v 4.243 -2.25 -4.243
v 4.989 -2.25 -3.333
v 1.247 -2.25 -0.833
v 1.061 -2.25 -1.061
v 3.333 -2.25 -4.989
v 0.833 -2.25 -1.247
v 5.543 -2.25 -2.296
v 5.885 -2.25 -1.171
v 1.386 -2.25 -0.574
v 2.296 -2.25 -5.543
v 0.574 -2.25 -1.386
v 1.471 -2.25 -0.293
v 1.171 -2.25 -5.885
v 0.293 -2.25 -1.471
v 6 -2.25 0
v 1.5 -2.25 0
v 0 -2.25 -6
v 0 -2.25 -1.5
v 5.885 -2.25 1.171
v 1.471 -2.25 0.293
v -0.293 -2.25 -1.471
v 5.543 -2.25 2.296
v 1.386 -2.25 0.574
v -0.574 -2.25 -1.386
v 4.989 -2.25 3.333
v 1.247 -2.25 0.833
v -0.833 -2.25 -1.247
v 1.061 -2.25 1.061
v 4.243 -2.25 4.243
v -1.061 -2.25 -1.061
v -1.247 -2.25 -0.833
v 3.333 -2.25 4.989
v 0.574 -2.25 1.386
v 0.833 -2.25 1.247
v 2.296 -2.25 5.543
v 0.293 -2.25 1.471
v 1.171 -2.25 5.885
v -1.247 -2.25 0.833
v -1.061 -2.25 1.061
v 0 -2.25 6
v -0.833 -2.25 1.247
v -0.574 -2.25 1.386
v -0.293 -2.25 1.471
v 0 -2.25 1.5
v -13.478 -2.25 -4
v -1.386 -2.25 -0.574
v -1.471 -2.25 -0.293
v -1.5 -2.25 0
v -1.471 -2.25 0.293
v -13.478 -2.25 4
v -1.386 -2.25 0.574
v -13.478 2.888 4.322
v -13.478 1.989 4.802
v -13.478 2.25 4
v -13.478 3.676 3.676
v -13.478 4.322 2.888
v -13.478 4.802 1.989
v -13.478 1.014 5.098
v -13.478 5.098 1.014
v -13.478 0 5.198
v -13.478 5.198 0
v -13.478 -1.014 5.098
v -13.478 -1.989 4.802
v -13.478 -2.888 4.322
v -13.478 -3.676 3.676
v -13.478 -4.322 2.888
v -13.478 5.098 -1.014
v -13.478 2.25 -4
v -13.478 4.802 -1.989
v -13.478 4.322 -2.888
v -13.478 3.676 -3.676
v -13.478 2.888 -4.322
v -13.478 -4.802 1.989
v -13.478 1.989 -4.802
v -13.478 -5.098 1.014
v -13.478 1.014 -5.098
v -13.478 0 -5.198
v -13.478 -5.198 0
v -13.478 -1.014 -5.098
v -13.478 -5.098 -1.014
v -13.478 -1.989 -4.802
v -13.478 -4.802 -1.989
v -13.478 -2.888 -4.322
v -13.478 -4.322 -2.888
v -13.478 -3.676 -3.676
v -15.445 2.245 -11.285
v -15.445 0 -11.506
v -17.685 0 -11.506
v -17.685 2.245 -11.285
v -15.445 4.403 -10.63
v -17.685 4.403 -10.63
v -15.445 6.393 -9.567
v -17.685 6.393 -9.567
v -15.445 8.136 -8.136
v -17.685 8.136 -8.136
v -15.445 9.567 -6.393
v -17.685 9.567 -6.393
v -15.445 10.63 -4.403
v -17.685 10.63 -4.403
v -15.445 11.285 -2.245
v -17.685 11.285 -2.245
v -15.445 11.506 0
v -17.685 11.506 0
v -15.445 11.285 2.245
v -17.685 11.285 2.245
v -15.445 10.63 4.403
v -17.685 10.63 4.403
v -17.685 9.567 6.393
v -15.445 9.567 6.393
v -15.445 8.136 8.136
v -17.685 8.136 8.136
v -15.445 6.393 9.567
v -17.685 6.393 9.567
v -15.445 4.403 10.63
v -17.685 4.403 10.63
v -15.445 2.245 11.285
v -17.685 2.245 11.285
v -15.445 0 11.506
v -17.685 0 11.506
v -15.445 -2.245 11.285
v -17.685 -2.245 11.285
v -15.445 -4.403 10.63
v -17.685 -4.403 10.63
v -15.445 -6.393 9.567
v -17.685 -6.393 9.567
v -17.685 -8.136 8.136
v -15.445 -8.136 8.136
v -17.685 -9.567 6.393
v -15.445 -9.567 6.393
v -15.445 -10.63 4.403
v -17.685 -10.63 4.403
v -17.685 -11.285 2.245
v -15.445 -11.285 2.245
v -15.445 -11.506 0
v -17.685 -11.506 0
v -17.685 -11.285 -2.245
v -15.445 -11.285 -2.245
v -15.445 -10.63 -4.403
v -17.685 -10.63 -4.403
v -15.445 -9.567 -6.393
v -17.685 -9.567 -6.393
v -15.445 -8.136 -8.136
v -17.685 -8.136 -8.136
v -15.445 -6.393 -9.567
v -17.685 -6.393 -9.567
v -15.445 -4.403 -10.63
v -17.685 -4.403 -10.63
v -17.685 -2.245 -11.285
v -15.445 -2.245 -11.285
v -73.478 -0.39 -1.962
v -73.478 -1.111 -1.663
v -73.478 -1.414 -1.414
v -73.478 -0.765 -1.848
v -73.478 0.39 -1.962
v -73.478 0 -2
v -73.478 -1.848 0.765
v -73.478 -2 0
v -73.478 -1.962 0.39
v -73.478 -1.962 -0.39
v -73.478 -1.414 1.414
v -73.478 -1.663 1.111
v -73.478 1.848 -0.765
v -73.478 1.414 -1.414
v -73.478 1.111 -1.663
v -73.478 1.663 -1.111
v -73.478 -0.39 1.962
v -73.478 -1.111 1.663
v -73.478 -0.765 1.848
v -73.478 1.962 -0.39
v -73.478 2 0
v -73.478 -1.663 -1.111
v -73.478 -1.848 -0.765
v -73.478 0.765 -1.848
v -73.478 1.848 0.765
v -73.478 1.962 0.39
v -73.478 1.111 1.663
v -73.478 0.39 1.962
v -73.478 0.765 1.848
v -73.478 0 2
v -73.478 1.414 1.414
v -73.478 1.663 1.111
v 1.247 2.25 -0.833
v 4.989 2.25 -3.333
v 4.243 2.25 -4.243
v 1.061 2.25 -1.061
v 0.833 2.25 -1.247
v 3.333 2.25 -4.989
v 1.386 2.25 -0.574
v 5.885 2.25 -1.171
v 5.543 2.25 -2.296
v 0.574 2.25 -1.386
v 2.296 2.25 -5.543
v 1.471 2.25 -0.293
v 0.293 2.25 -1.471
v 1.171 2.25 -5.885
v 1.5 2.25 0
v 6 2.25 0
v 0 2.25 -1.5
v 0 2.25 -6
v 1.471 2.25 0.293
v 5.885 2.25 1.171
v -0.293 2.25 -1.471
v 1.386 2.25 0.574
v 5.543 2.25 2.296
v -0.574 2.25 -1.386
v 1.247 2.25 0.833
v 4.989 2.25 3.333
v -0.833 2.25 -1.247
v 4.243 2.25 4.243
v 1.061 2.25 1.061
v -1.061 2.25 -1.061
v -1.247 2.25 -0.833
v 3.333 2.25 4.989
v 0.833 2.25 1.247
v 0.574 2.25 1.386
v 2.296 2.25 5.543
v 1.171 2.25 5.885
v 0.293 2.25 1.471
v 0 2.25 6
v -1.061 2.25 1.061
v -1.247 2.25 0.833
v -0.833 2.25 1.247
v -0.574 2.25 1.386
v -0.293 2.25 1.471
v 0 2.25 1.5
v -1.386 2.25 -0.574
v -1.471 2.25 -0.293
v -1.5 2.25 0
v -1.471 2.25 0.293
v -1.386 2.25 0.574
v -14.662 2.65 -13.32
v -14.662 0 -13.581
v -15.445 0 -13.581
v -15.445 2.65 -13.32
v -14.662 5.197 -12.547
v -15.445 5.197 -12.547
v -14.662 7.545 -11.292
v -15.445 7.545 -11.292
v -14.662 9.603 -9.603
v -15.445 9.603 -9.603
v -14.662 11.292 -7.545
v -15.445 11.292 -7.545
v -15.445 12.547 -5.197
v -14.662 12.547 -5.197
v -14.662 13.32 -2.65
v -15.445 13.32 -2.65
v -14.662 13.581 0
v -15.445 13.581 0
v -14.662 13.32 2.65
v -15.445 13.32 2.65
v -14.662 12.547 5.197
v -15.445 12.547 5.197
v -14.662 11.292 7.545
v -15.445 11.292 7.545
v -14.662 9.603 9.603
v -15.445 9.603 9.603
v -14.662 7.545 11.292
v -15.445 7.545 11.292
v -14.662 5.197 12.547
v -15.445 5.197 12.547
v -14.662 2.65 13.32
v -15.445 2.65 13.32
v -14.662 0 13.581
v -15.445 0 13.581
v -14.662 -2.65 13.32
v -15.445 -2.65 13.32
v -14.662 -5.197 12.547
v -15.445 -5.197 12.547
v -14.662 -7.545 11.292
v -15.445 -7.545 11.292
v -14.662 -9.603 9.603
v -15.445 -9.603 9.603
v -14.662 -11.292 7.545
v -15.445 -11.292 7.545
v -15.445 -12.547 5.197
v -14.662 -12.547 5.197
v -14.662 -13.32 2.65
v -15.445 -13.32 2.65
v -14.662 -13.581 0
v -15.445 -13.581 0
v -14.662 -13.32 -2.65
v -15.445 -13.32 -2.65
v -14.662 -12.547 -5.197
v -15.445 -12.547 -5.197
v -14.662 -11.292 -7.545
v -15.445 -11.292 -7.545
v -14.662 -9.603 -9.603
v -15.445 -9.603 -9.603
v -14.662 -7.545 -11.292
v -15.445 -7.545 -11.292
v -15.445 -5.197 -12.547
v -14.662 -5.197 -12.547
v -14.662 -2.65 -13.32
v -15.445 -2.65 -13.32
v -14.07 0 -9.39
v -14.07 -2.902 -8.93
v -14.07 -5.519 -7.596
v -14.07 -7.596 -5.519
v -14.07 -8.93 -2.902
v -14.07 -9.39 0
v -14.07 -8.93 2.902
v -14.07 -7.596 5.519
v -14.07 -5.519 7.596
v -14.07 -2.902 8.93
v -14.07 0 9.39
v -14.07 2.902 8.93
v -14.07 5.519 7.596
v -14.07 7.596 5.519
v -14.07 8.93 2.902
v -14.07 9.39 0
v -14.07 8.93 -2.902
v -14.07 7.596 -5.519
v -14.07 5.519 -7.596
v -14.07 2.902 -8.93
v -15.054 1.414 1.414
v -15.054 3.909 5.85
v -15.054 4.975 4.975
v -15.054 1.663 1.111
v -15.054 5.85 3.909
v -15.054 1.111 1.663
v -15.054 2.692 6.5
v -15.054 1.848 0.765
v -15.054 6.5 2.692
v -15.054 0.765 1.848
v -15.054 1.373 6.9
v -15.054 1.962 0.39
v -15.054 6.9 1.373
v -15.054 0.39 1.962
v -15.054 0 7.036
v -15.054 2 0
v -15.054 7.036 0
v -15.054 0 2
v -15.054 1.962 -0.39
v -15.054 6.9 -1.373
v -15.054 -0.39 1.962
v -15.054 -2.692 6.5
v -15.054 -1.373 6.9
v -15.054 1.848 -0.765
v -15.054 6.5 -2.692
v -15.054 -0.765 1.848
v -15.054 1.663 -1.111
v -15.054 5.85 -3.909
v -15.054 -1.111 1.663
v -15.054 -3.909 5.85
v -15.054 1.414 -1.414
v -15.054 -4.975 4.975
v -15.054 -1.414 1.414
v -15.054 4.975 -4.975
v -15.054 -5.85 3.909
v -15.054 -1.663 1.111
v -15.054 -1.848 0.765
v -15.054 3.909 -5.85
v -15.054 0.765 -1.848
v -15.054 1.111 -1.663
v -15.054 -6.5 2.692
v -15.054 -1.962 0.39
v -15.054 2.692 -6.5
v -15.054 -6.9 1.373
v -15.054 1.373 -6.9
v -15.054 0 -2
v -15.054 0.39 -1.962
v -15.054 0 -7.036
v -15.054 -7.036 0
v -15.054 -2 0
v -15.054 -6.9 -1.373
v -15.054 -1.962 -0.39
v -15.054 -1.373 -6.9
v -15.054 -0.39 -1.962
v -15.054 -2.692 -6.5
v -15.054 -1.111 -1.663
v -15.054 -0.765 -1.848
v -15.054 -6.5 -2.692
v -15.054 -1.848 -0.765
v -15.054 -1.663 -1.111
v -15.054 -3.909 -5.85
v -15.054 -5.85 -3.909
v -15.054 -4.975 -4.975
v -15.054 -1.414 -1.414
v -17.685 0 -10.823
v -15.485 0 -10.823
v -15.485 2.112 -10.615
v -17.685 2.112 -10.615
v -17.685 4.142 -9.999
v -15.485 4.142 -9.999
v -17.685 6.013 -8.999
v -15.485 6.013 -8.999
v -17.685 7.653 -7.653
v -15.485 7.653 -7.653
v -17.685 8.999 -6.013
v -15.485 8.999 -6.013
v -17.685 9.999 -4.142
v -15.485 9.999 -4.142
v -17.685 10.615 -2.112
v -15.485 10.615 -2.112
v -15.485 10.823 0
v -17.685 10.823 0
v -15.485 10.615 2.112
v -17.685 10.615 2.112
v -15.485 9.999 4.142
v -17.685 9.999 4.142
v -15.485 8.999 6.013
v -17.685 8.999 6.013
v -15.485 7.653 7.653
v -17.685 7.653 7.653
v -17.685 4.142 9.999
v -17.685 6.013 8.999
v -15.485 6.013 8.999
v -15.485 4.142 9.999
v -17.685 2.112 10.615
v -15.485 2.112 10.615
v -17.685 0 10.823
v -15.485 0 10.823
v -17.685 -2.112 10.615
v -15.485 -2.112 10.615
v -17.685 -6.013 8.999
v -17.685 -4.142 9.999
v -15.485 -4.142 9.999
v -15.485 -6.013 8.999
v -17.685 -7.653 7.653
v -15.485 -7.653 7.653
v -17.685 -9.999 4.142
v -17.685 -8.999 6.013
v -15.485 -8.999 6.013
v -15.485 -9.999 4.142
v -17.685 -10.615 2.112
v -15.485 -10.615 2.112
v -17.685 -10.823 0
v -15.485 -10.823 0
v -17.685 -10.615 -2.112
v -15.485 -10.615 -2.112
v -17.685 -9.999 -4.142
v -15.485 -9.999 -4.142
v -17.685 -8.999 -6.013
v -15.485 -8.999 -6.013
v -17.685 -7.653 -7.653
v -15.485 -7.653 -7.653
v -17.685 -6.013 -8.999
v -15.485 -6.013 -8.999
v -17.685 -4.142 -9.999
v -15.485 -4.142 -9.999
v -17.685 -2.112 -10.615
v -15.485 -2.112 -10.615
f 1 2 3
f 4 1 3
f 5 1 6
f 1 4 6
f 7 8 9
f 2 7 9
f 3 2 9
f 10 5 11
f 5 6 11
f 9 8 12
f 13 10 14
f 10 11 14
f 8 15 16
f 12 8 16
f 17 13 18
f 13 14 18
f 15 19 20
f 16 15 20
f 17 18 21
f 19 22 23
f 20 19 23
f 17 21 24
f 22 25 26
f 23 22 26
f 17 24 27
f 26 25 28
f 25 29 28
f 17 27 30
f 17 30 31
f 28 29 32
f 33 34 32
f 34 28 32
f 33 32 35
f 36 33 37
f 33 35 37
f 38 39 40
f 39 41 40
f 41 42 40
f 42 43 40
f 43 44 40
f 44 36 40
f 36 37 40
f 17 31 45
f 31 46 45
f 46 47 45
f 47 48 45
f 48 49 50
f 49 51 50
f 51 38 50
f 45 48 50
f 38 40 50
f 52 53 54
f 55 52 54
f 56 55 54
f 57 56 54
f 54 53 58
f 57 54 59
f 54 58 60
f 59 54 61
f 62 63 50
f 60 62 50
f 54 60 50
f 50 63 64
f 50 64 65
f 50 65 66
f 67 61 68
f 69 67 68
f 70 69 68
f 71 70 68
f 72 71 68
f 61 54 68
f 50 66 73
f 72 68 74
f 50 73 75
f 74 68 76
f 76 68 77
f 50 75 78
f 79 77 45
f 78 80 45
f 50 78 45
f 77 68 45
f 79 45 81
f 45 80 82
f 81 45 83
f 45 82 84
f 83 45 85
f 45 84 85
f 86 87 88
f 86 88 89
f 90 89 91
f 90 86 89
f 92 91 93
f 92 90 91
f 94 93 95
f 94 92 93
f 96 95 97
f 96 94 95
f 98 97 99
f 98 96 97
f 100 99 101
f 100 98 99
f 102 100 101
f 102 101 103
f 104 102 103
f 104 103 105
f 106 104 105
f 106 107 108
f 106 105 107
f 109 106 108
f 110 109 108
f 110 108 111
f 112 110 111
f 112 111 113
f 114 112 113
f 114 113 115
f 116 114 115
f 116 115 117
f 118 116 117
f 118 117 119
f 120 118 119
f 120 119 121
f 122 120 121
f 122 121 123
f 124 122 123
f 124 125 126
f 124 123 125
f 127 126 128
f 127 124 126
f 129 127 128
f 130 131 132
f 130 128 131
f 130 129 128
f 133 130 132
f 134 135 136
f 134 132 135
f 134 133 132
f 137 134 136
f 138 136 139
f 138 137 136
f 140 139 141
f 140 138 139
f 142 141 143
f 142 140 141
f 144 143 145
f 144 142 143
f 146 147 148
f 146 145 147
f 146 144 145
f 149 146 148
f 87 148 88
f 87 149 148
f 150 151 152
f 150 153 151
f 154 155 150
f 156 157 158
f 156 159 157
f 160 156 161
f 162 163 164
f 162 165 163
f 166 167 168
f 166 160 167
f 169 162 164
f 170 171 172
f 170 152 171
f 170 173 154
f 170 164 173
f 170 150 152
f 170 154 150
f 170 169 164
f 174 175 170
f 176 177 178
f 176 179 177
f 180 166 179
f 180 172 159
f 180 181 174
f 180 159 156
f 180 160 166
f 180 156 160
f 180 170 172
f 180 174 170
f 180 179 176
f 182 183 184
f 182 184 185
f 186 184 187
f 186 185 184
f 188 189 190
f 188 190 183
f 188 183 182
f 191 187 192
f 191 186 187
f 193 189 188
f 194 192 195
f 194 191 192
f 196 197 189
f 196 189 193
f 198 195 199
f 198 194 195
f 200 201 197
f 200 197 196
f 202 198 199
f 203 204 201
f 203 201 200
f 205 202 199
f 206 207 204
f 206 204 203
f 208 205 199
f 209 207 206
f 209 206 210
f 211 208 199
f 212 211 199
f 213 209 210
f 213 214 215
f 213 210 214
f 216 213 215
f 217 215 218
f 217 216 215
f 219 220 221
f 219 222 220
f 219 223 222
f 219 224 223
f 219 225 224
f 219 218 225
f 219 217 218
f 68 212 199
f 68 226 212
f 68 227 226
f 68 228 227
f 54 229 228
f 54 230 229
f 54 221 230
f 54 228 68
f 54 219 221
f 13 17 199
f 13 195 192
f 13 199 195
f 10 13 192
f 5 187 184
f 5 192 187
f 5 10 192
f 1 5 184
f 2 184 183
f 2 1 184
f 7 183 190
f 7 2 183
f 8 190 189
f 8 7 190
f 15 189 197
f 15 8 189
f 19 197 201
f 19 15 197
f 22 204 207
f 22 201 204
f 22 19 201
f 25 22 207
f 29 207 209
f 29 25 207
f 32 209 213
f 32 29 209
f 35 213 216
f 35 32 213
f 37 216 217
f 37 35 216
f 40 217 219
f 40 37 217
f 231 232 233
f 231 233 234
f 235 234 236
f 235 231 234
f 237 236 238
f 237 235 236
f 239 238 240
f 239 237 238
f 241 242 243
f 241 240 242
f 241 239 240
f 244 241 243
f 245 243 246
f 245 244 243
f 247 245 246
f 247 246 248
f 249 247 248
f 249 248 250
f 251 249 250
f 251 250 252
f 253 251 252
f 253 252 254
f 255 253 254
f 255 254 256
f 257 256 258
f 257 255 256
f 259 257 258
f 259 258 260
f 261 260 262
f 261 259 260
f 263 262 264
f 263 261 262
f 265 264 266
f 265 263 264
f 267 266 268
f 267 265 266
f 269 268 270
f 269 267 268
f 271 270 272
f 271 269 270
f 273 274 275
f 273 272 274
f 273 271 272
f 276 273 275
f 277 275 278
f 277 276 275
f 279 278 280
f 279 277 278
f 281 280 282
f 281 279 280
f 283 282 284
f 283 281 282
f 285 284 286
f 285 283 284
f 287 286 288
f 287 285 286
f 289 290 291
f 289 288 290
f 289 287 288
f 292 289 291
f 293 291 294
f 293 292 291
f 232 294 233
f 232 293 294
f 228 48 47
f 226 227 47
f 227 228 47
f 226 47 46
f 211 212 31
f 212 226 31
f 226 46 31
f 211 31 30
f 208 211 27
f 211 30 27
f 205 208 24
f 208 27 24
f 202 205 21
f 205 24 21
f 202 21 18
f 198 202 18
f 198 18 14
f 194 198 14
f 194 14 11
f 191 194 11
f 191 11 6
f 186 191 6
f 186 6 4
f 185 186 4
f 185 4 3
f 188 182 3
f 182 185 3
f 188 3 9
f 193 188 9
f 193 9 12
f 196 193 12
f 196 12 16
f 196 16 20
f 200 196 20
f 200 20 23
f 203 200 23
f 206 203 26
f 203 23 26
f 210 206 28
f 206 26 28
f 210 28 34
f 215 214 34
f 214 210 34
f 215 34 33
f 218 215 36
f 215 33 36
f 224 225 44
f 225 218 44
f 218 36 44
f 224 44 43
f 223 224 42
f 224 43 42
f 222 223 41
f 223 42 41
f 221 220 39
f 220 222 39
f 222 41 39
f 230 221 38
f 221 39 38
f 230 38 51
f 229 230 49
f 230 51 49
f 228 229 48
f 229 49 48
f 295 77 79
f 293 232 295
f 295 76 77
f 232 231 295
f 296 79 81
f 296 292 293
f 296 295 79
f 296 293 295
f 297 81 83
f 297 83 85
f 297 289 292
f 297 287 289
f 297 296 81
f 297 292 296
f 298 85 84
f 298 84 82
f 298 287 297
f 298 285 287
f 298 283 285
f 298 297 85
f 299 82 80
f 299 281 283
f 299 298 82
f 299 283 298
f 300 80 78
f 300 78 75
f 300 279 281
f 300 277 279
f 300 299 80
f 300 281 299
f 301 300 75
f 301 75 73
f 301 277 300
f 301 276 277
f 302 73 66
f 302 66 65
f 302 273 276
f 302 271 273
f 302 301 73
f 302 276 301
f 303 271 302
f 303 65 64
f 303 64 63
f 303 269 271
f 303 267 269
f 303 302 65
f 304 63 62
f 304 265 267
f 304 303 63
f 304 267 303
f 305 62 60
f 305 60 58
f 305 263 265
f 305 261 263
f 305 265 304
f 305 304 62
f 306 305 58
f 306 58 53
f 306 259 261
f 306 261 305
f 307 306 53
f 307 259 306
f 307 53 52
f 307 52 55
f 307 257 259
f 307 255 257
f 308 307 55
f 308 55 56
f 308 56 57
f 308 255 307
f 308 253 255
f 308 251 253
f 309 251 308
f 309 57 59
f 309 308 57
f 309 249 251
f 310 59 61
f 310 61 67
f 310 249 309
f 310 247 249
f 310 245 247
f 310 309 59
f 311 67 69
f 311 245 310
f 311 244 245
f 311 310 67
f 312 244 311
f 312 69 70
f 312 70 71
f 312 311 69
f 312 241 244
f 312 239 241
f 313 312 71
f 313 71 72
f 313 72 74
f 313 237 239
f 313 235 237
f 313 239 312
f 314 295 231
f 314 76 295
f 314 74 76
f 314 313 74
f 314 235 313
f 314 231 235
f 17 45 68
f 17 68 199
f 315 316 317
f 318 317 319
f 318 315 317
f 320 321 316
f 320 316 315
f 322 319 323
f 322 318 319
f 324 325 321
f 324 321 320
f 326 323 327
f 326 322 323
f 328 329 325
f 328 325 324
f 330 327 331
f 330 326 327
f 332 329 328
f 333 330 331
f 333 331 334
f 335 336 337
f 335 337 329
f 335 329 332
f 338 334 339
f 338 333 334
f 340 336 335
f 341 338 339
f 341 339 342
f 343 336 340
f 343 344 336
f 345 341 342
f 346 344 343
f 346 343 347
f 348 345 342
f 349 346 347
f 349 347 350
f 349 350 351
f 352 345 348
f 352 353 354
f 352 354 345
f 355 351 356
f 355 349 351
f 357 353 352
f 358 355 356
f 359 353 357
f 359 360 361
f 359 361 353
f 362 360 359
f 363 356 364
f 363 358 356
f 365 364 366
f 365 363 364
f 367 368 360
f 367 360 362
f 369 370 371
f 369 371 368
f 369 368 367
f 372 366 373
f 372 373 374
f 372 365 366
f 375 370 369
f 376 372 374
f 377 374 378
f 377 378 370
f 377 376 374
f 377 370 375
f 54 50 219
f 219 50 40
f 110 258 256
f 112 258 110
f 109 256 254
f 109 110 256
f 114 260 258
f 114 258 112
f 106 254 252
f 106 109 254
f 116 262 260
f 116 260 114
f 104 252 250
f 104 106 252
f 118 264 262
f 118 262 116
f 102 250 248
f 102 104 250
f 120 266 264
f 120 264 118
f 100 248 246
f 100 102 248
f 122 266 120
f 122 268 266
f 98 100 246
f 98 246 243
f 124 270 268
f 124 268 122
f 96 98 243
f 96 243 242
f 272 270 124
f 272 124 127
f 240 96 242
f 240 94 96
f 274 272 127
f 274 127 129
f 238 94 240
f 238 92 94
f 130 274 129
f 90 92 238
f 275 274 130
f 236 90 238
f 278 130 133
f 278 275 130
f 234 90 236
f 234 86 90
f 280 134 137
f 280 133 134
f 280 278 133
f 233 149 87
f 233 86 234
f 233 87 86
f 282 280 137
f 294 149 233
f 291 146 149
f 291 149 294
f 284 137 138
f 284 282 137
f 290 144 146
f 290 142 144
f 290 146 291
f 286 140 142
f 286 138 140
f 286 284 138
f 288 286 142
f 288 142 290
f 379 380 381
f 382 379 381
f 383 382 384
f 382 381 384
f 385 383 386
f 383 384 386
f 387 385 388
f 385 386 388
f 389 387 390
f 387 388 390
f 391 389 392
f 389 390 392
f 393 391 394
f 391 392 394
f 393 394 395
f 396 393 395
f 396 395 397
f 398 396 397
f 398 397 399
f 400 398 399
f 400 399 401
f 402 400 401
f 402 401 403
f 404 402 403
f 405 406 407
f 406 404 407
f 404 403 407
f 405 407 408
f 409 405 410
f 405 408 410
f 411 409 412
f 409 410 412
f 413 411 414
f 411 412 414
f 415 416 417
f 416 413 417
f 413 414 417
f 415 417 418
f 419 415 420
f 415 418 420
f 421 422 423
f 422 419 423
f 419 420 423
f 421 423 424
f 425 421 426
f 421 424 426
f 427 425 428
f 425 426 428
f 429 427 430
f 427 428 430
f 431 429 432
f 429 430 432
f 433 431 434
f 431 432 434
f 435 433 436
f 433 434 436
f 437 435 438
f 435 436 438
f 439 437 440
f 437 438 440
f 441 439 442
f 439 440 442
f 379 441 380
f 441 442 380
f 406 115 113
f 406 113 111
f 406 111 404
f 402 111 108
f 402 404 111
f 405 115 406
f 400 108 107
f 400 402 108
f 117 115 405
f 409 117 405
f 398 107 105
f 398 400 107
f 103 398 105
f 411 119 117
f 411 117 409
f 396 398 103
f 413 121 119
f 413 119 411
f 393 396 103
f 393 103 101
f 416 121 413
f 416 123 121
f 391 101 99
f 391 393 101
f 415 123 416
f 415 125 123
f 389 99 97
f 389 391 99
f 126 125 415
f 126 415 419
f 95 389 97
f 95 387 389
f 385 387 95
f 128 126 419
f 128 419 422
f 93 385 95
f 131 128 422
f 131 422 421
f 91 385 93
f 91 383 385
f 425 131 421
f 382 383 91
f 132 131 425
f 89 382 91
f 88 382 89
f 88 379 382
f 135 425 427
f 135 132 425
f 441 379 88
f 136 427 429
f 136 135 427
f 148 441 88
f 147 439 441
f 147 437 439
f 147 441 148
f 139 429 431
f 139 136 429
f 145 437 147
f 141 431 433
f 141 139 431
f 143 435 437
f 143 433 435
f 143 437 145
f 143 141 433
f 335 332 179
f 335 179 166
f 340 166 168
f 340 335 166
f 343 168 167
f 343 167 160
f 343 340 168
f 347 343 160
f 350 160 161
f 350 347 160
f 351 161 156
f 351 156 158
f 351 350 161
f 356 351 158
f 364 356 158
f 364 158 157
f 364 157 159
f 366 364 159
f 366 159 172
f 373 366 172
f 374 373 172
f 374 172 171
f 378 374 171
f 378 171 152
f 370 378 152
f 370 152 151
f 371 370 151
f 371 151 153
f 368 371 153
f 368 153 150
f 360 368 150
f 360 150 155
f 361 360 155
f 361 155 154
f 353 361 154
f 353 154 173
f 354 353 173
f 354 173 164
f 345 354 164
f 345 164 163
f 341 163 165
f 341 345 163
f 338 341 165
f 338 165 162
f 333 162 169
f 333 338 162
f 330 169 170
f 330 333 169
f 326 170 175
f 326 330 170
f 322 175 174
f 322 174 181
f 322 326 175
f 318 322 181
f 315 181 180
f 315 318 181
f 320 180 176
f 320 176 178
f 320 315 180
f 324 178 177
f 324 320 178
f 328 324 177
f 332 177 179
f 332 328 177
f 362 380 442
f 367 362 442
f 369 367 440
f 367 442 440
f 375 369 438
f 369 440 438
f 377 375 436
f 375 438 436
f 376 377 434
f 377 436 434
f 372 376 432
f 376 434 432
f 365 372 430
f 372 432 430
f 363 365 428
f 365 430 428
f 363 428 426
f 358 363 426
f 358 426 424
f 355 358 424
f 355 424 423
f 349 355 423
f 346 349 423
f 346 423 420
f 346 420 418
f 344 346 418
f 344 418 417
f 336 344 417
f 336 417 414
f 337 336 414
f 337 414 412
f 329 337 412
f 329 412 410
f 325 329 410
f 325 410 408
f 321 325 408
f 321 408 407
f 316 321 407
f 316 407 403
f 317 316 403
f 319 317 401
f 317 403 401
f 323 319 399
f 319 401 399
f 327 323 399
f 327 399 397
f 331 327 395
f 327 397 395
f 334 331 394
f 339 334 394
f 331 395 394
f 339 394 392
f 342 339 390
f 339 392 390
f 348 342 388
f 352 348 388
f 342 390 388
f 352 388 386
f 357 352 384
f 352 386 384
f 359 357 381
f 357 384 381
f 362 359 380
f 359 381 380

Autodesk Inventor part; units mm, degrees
ref_plane "YZ Plane" through (0, 0, 0) normal (1, 0, 0) x (0, 1, 0)
ref_plane "XZ Plane" through (0, 0, 0) normal (0, 1, 0) x (-1, 0, 0)
ref_plane "XY Plane" through (0, 0, 0) normal (0, 0, 1) x (1, 0, 0)
sketch "Sketch1" plane through (0, 0, 0) normal (0, 1, 0) x (-1, 0, 0)
  circle A0 centre (0, 0) radius 1.5
  circle A1 centre (0, 0) radius 6
  line L0 (13.4781, 0) -> (13.4781, -4)
  line L1 (13.4781, 0) -> (13.4781, 4)
  line L2 (13.4781, 4) -> (0, 6)
  line L3 (13.4781, -4) -> (0, -6)
  dimension "d0" = 3
  dimension "d1" = 12
  dimension "d2" = 4
extrude "Extrusion1" add sketch "Sketch1" along normal mid plane 4.5 contours L2 A1 L3 | L2 L1 L0 L3 A1
sketch "Sketch2" plane through (-13.4781, -2.25, -4) normal (-1, 0, 0) x (0, 0, 1)
  line L0 (2.5, 4.5) -> (2.5, 0) projected
  line L1 (8, 0) -> (0, 0) projected
  line L2 (8, 4.5) -> (8, 0) projected
  line L3 (0, 4.5) -> (8, 4.5) projected
  line L4 (0, 0) -> (0, 4.5) projected
  circle A0 centre (4, 2.25) radius 2
  dimension "d5" = 4
extrude "Extrusion2" add sketch "Sketch2" along normal blind 60 contours A0 L0 | L0 A0
fillet "Fillet1" [suppressed]
sketch "Sketch4" plane through (0, 0, 0) normal (0, 1, 0) x (-1, 0, 0)
  line L0 (13.4781, 4) -> (0, 6) projected
  arc A0 (0, 6) -> (0, -6) centre (0, 0) ccw projected
  line L1 (0, -6) -> (13.4781, -4) projected
  line L2 (13.4781, -4) -> (13.4781, 4) projected
  circle A1 centre (0, 0) radius 1.5 projected
  line L3 (13.4781, 4) -> (13.4781, -4) projected
  line L4 (13.4781, 0) -> (17.6846, 0)
  line L5 (17.6846, 0) -> (17.6846, 0.0214)
  line L6 (17.6846, -11.5062) -> (15.4451, -11.5062)
  line L7 (15.4451, -11.5062) -> (15.4451, -13.5813)
  line L8 (15.4451, -13.5813) -> (14.6622, -13.5813)
  line L9 (13.4781, -4) -> (13.4781, -5.198)
  line L10 (13.4781, -5.198) -> (14.6622, -13.5813)
  line L11 (17.6846, -11.5062) -> (17.6846, -10.8233)
  line L12 (17.6846, -10.8233) -> (15.4853, -10.8233)
  line L13 (15.4853, -10.8233) -> (15.0537, -7.0356)
  line L14 (15.0537, -7.0356) -> (15.0537, 0)
  dimension "d13" = 11.5062
revolve "Revolution1" add sketch "Sketch4" angle 360 about axis through (-13.4781, 0, 0) along (-1, 0, 0) contours L4 L14 L13 L12 L11 L6 L7 L8 L10 L9 L2
properties part number "100MMshockLower"
